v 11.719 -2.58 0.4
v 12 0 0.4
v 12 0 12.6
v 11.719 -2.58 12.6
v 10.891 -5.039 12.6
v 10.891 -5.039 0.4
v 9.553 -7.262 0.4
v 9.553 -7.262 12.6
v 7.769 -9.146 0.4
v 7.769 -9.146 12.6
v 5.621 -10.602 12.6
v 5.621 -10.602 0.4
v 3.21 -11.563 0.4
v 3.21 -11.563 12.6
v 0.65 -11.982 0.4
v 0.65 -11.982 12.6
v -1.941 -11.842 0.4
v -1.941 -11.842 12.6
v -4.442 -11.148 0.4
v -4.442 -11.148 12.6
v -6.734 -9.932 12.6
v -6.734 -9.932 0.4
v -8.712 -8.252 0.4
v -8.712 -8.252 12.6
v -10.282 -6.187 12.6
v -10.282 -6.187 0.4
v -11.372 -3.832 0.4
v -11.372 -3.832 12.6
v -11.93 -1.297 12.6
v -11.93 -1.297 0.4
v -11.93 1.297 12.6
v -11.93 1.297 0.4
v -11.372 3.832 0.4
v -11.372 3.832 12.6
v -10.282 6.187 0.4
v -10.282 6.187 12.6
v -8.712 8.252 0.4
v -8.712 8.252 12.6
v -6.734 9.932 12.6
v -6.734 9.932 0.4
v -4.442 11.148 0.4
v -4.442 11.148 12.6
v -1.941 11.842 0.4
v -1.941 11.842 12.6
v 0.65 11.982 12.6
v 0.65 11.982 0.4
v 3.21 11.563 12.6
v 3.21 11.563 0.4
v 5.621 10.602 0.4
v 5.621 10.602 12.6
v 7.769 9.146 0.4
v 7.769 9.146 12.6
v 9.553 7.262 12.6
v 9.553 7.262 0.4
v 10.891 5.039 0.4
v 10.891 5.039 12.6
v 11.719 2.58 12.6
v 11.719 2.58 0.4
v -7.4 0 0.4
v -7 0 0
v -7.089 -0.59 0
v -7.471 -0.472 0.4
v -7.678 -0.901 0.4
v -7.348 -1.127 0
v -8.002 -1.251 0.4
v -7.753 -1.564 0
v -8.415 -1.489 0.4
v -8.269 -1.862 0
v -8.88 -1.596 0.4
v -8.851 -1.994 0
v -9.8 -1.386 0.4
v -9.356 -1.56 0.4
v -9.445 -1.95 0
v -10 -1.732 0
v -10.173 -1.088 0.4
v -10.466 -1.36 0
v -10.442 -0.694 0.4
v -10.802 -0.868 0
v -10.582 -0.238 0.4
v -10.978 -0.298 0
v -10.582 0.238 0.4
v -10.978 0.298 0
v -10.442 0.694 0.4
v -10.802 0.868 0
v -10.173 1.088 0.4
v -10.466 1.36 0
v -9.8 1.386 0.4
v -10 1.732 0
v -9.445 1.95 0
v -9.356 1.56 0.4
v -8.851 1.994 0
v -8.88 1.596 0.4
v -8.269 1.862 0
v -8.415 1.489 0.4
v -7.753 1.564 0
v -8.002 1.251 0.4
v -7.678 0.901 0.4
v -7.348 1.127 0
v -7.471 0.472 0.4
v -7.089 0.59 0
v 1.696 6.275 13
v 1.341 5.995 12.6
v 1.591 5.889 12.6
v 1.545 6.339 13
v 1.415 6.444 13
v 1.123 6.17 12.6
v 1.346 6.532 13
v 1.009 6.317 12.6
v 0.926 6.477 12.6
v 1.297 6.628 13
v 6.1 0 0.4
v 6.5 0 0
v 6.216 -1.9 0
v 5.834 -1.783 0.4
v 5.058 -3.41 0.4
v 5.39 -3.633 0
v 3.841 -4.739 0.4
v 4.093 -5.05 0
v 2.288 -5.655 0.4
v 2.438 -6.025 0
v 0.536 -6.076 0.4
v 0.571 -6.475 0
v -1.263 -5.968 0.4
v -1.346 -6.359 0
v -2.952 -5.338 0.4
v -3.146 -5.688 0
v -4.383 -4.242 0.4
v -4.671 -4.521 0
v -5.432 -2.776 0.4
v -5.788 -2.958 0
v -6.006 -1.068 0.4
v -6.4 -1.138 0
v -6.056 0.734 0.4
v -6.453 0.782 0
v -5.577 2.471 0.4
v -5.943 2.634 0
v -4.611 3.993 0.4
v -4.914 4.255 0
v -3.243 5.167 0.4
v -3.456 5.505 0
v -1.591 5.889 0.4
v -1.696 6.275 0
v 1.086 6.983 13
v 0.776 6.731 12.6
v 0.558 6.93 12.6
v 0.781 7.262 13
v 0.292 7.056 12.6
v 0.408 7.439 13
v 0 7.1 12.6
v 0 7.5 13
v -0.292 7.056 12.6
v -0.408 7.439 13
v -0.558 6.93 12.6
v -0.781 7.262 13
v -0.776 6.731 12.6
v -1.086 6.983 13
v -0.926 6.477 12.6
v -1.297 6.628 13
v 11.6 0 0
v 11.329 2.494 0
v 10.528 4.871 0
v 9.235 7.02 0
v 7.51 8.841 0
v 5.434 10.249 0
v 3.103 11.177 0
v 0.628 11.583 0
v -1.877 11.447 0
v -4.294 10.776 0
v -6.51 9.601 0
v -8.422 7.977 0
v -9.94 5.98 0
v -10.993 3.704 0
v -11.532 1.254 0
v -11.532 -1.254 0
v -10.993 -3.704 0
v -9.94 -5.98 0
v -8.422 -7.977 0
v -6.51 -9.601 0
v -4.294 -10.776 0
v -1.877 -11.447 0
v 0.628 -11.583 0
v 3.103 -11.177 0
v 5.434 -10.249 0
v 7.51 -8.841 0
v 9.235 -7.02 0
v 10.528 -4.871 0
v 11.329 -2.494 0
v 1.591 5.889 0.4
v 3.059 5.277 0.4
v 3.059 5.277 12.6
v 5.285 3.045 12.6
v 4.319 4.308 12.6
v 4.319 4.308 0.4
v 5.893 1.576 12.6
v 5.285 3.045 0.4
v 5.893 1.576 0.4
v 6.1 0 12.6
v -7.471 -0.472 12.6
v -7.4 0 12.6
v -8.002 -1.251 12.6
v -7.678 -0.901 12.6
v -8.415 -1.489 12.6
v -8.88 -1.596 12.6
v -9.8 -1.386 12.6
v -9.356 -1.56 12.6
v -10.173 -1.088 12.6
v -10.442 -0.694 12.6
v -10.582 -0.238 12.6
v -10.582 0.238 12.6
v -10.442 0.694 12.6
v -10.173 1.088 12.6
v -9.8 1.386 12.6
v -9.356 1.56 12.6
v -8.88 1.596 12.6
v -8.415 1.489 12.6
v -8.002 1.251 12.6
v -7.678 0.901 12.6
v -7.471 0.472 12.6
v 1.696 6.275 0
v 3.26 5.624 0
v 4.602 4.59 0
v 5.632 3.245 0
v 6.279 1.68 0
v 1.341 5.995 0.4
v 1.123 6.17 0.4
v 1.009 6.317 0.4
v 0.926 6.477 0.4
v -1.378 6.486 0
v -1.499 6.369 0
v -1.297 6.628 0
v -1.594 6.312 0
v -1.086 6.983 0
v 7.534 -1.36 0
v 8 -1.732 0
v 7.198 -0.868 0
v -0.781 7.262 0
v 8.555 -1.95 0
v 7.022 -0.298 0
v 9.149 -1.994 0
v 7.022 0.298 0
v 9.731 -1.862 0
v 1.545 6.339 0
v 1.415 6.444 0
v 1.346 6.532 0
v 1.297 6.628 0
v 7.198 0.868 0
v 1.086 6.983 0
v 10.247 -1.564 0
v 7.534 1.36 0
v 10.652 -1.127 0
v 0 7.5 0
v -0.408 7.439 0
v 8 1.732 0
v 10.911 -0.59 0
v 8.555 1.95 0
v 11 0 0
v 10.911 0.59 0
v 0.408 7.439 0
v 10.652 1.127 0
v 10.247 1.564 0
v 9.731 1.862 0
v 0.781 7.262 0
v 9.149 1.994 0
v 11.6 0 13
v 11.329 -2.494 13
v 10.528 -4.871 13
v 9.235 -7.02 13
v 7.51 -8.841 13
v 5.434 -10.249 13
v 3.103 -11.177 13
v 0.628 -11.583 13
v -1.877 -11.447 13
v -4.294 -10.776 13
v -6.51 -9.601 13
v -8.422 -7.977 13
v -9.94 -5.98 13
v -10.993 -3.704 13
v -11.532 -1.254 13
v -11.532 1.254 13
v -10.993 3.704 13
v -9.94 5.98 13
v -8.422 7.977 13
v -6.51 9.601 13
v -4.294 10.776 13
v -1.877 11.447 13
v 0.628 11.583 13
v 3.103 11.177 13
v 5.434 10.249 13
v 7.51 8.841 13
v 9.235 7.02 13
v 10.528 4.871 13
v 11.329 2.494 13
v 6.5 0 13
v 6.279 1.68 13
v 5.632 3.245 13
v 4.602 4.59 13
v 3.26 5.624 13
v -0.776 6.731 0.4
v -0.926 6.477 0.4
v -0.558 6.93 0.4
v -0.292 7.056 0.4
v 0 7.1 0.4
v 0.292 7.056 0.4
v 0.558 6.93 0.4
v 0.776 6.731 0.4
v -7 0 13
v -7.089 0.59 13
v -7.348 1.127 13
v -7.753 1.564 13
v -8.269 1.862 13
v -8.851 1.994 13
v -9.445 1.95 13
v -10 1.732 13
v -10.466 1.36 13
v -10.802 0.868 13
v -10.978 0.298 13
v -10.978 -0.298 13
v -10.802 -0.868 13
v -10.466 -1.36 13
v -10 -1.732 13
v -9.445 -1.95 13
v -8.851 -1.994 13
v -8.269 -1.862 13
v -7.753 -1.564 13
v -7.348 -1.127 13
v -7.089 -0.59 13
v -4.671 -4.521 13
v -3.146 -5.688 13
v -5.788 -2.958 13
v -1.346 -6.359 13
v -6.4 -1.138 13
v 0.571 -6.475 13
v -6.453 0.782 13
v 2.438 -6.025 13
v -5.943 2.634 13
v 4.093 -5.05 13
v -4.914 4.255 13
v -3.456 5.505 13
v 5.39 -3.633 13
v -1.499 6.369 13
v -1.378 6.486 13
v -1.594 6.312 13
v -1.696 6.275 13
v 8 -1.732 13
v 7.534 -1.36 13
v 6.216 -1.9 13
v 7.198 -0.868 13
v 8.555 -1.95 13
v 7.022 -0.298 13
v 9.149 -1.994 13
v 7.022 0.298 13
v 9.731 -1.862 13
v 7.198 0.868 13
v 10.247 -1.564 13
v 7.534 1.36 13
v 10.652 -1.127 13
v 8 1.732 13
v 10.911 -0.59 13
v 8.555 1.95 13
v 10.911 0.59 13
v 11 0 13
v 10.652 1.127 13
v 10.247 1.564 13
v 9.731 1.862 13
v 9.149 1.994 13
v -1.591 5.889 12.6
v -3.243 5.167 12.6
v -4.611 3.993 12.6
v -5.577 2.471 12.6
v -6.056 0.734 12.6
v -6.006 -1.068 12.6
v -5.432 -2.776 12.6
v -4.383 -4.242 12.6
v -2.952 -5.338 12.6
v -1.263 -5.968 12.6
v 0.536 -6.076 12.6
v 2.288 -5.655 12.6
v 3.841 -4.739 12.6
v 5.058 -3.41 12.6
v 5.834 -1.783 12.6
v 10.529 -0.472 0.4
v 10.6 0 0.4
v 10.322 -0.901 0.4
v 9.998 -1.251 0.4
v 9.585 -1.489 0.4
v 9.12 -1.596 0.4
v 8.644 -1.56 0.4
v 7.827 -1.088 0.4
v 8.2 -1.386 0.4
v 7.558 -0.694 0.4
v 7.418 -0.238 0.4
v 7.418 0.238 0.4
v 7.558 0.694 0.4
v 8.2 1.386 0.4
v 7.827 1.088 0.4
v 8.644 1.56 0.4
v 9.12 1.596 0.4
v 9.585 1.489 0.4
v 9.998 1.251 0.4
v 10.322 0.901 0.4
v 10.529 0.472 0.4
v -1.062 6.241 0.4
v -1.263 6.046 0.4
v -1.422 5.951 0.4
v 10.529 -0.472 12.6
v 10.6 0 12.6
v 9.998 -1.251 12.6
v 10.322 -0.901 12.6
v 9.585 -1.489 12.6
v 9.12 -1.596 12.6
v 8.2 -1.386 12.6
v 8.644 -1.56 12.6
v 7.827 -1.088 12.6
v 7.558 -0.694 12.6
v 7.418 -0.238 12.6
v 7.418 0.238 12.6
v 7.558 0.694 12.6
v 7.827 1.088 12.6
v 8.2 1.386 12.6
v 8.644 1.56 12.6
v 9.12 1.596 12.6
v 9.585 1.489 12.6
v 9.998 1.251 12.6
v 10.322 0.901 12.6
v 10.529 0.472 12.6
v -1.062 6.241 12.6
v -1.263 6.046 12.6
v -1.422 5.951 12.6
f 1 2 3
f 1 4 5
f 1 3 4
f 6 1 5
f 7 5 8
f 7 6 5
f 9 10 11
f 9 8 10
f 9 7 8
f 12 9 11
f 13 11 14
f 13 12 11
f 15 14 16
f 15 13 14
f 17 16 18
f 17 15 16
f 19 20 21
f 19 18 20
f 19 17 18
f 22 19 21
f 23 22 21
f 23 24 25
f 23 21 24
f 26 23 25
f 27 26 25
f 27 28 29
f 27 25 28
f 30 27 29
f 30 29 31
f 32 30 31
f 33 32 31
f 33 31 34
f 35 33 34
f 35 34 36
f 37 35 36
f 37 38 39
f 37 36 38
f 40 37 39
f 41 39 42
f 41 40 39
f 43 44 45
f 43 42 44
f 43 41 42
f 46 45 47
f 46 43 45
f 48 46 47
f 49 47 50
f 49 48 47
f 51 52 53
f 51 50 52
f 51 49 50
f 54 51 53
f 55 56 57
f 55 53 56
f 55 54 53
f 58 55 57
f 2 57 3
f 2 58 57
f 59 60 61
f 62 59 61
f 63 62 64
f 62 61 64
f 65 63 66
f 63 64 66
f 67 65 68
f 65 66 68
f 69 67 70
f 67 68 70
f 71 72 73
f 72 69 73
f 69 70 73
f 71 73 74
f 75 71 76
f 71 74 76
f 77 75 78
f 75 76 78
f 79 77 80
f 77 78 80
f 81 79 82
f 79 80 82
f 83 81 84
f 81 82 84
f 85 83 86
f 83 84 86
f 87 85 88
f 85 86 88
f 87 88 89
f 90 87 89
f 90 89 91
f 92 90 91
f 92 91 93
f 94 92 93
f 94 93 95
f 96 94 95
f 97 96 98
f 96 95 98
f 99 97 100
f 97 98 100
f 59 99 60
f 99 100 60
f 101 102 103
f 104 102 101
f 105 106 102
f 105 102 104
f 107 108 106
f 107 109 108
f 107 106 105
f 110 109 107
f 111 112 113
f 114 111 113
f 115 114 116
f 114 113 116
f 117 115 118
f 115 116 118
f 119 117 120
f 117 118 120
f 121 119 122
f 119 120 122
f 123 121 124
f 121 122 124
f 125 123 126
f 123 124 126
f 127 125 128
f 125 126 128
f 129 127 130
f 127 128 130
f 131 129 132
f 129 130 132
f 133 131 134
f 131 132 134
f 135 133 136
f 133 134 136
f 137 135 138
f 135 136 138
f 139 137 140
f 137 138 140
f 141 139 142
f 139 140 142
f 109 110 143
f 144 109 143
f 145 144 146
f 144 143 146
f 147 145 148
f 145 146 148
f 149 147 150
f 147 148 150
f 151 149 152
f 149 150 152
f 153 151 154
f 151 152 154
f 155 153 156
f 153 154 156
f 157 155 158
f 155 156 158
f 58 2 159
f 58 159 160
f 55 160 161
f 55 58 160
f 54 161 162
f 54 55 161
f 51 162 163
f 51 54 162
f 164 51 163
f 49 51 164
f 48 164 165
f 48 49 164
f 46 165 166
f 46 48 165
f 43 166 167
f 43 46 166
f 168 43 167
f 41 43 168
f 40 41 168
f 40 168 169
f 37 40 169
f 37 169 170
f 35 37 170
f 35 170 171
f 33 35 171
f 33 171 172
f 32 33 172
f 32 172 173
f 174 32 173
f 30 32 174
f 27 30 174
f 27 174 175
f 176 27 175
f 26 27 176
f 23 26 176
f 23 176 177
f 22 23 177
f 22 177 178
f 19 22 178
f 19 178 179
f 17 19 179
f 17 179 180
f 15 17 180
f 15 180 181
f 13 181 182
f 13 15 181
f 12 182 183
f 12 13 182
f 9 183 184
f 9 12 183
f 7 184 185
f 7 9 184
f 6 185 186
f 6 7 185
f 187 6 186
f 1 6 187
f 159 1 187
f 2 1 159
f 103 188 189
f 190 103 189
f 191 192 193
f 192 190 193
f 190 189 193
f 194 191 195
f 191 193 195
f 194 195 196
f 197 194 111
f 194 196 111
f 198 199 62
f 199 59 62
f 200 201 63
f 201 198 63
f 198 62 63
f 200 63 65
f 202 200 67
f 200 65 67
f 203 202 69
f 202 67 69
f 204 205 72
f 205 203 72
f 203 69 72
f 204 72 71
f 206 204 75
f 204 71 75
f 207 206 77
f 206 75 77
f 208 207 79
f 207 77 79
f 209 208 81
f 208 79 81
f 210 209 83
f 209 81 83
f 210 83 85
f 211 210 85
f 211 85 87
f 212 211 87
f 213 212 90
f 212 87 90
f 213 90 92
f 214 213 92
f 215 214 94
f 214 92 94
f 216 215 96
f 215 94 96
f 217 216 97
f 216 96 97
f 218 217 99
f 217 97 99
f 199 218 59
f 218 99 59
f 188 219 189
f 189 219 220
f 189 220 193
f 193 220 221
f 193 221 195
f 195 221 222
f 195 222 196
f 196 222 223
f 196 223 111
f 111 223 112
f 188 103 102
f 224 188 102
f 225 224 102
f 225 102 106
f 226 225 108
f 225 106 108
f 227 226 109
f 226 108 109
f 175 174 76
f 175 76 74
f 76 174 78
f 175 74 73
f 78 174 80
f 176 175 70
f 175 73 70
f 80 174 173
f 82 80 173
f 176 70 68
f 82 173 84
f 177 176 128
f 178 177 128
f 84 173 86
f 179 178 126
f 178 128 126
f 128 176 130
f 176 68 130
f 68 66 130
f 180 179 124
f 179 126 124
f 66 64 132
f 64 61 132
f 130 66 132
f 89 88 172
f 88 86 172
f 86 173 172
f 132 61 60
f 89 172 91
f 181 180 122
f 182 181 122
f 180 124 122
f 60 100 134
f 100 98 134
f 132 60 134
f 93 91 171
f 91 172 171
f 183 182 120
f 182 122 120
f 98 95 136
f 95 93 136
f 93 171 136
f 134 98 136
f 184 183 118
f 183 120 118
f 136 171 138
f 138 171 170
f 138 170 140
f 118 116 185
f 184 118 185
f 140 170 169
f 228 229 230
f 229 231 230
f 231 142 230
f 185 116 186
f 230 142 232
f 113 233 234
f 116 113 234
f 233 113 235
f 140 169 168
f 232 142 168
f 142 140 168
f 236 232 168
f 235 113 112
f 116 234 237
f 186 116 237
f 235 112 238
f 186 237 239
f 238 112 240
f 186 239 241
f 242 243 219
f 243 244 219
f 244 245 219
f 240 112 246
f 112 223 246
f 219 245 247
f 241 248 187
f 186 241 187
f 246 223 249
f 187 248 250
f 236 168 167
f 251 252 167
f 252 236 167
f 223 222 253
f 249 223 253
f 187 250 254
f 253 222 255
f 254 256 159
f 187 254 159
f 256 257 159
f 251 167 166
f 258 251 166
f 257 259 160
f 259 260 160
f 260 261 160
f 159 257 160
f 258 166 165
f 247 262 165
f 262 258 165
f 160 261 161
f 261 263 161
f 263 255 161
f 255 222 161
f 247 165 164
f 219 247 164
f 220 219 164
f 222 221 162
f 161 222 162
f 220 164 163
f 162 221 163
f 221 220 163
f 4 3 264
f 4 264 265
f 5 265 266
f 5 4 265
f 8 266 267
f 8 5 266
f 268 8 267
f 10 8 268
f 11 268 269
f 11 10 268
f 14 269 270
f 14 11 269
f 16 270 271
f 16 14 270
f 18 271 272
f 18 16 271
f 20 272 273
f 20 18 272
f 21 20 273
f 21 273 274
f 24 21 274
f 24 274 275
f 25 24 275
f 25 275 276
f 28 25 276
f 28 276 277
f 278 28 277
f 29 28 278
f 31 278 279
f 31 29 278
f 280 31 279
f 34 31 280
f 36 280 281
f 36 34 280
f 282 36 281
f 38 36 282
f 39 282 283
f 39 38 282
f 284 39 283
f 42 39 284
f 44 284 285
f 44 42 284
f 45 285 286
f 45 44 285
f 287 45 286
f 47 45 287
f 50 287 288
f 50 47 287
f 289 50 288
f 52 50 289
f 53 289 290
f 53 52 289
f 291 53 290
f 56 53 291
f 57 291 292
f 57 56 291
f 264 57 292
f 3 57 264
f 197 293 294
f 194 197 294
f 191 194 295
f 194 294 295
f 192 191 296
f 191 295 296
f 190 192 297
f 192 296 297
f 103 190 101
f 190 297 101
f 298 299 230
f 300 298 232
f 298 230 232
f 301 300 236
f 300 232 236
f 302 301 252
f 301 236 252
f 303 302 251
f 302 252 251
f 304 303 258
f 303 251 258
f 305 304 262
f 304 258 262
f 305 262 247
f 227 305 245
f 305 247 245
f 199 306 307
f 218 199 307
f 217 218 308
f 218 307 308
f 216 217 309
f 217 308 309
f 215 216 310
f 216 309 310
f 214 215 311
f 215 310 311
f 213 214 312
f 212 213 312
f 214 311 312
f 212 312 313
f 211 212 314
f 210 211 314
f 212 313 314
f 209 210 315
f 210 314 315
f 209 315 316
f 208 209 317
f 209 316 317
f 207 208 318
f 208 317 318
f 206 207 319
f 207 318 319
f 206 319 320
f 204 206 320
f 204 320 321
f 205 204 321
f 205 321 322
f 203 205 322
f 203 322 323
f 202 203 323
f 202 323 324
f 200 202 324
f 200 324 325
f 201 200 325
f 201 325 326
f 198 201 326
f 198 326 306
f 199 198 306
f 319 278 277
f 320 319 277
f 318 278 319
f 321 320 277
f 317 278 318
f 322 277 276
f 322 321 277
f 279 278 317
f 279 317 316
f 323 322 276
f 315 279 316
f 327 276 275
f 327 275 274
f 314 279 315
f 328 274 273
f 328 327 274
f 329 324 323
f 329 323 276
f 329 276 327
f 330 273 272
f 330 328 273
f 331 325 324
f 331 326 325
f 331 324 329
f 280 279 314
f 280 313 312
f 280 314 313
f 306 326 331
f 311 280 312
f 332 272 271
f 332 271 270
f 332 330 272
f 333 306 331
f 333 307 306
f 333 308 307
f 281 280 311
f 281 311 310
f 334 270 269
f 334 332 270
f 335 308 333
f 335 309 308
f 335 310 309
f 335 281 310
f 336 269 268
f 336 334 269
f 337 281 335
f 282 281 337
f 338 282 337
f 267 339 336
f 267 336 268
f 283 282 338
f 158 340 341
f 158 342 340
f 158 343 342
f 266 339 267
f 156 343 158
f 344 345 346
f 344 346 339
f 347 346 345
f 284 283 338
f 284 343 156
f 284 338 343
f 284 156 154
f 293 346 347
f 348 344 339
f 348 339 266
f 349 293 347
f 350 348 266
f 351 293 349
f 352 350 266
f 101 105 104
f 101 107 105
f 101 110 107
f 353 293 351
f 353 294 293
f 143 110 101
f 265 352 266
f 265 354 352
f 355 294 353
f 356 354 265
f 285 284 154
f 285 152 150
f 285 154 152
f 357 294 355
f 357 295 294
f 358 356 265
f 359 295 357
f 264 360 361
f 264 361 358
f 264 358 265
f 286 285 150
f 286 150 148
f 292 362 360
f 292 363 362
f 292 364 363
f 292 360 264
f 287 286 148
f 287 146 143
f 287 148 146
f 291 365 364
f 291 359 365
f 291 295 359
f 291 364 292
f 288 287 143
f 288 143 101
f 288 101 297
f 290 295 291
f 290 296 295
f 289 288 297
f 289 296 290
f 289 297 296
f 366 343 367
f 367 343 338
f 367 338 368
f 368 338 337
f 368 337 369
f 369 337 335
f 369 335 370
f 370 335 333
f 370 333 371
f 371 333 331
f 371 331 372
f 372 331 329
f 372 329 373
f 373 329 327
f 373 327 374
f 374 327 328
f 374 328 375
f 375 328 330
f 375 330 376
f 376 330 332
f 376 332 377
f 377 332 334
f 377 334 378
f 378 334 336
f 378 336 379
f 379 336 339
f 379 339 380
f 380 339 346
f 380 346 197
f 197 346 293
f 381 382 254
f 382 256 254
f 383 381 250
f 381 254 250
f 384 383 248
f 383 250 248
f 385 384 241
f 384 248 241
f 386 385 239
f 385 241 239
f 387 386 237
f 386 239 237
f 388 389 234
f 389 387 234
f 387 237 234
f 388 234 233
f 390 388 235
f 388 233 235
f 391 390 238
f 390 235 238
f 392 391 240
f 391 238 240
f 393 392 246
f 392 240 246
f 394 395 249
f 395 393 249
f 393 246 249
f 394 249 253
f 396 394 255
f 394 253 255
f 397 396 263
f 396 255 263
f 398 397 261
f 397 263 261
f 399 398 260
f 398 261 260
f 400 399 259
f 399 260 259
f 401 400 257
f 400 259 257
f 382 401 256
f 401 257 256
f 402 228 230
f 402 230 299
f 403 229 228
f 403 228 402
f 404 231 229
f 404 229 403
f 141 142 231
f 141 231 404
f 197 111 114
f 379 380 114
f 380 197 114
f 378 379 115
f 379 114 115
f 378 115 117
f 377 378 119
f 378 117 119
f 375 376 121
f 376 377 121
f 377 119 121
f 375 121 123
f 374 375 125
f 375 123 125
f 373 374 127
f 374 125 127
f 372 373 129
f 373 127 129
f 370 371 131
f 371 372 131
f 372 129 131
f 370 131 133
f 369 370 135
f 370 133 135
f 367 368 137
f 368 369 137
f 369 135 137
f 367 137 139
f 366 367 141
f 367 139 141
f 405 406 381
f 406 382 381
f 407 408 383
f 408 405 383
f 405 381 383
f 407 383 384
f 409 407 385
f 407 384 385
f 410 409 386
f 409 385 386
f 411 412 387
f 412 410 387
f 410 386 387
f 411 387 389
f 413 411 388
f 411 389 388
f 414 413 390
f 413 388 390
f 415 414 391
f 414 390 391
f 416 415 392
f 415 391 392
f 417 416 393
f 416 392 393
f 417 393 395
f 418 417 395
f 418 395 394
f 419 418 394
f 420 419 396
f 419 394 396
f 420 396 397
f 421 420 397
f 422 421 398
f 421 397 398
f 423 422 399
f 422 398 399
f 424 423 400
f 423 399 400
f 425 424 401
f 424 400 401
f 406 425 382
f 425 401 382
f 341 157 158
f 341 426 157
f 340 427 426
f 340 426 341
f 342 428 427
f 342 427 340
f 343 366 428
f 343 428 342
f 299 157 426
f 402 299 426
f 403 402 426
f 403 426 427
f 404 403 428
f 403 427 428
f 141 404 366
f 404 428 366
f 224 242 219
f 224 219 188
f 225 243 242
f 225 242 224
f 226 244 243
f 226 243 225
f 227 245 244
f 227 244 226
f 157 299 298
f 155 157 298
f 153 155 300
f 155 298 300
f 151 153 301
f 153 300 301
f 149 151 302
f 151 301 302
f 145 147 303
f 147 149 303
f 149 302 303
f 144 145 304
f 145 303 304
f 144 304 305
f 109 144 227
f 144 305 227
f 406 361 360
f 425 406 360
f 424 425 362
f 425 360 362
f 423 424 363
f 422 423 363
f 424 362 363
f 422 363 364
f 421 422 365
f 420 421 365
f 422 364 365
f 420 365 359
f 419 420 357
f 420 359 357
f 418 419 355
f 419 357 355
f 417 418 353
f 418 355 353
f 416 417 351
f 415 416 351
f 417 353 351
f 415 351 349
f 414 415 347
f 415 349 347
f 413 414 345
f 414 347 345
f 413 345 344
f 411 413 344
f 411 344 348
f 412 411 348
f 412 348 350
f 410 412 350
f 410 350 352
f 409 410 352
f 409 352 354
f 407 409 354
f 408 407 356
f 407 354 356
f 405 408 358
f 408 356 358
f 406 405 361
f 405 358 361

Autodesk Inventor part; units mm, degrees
ref_plane "YZ Plane" through (0, 0, 0) normal (1, 0, 0) x (0, 1, 0)
ref_plane "XZ Plane" through (0, 0, 0) normal (0, 1, 0) x (-1, 0, 0)
ref_plane "XY Plane" through (0, 0, 0) normal (0, 0, 1) x (1, 0, 0)
sketch "Эскиз1" plane through (0, 0, 0) normal (0, 0, 1) x (1, 0, 0)
  circle A0 centre (0, 0) radius 6.1
  circle A1 centre (0, 0) radius 12
  circle A2 centre (0, 0) radius 9 construction
  line L0 (-16.8, 0) -> (16.8, 0) construction
  circle A3 centre (-9, 0) radius 1.6
  circle A4 centre (9, 0) radius 1.6
  line L1 (0, -16.8) -> (0, 16.8) construction
  circle A5 centre (0, 6.1) radius 1
  point P0 (0.9966, 6.018)
  point P1 (-0.9966, 6.018)
  dimension "d0" = 12.2
  dimension "d1" = 24
  dimension "d2" = 18
  dimension "d3" = 3.2
  dimension "d4" = 3.2
  dimension "d10" = 2
extrude "Выдавливание1" add sketch "Эскиз1" along normal blind 13
fillet "Сопряжение1" radius 1 2 edges at (-0.9966, 6.018, 6.5) (0.9966, 6.018, 6.5)
chamfer "Фаска2" distance 0.4 angle 45 14 edges at (-1.1899, 6.105, 0) (1.1899, 6.105, 0) (0, -6.1, 0) (0, 7.1, 0) (-12, 0, 0) (7.4, 0, 0) (-10.6, 0, 0) (0, -6.1, 13) (-1.1899, 6.105, 13) (1.1899, 6.105, 13) (0, 7.1, 13) (-12, 0, 13) (-10.6, 0, 13) (7.4, 0, 13)
properties part number "Проставка шестерни"
